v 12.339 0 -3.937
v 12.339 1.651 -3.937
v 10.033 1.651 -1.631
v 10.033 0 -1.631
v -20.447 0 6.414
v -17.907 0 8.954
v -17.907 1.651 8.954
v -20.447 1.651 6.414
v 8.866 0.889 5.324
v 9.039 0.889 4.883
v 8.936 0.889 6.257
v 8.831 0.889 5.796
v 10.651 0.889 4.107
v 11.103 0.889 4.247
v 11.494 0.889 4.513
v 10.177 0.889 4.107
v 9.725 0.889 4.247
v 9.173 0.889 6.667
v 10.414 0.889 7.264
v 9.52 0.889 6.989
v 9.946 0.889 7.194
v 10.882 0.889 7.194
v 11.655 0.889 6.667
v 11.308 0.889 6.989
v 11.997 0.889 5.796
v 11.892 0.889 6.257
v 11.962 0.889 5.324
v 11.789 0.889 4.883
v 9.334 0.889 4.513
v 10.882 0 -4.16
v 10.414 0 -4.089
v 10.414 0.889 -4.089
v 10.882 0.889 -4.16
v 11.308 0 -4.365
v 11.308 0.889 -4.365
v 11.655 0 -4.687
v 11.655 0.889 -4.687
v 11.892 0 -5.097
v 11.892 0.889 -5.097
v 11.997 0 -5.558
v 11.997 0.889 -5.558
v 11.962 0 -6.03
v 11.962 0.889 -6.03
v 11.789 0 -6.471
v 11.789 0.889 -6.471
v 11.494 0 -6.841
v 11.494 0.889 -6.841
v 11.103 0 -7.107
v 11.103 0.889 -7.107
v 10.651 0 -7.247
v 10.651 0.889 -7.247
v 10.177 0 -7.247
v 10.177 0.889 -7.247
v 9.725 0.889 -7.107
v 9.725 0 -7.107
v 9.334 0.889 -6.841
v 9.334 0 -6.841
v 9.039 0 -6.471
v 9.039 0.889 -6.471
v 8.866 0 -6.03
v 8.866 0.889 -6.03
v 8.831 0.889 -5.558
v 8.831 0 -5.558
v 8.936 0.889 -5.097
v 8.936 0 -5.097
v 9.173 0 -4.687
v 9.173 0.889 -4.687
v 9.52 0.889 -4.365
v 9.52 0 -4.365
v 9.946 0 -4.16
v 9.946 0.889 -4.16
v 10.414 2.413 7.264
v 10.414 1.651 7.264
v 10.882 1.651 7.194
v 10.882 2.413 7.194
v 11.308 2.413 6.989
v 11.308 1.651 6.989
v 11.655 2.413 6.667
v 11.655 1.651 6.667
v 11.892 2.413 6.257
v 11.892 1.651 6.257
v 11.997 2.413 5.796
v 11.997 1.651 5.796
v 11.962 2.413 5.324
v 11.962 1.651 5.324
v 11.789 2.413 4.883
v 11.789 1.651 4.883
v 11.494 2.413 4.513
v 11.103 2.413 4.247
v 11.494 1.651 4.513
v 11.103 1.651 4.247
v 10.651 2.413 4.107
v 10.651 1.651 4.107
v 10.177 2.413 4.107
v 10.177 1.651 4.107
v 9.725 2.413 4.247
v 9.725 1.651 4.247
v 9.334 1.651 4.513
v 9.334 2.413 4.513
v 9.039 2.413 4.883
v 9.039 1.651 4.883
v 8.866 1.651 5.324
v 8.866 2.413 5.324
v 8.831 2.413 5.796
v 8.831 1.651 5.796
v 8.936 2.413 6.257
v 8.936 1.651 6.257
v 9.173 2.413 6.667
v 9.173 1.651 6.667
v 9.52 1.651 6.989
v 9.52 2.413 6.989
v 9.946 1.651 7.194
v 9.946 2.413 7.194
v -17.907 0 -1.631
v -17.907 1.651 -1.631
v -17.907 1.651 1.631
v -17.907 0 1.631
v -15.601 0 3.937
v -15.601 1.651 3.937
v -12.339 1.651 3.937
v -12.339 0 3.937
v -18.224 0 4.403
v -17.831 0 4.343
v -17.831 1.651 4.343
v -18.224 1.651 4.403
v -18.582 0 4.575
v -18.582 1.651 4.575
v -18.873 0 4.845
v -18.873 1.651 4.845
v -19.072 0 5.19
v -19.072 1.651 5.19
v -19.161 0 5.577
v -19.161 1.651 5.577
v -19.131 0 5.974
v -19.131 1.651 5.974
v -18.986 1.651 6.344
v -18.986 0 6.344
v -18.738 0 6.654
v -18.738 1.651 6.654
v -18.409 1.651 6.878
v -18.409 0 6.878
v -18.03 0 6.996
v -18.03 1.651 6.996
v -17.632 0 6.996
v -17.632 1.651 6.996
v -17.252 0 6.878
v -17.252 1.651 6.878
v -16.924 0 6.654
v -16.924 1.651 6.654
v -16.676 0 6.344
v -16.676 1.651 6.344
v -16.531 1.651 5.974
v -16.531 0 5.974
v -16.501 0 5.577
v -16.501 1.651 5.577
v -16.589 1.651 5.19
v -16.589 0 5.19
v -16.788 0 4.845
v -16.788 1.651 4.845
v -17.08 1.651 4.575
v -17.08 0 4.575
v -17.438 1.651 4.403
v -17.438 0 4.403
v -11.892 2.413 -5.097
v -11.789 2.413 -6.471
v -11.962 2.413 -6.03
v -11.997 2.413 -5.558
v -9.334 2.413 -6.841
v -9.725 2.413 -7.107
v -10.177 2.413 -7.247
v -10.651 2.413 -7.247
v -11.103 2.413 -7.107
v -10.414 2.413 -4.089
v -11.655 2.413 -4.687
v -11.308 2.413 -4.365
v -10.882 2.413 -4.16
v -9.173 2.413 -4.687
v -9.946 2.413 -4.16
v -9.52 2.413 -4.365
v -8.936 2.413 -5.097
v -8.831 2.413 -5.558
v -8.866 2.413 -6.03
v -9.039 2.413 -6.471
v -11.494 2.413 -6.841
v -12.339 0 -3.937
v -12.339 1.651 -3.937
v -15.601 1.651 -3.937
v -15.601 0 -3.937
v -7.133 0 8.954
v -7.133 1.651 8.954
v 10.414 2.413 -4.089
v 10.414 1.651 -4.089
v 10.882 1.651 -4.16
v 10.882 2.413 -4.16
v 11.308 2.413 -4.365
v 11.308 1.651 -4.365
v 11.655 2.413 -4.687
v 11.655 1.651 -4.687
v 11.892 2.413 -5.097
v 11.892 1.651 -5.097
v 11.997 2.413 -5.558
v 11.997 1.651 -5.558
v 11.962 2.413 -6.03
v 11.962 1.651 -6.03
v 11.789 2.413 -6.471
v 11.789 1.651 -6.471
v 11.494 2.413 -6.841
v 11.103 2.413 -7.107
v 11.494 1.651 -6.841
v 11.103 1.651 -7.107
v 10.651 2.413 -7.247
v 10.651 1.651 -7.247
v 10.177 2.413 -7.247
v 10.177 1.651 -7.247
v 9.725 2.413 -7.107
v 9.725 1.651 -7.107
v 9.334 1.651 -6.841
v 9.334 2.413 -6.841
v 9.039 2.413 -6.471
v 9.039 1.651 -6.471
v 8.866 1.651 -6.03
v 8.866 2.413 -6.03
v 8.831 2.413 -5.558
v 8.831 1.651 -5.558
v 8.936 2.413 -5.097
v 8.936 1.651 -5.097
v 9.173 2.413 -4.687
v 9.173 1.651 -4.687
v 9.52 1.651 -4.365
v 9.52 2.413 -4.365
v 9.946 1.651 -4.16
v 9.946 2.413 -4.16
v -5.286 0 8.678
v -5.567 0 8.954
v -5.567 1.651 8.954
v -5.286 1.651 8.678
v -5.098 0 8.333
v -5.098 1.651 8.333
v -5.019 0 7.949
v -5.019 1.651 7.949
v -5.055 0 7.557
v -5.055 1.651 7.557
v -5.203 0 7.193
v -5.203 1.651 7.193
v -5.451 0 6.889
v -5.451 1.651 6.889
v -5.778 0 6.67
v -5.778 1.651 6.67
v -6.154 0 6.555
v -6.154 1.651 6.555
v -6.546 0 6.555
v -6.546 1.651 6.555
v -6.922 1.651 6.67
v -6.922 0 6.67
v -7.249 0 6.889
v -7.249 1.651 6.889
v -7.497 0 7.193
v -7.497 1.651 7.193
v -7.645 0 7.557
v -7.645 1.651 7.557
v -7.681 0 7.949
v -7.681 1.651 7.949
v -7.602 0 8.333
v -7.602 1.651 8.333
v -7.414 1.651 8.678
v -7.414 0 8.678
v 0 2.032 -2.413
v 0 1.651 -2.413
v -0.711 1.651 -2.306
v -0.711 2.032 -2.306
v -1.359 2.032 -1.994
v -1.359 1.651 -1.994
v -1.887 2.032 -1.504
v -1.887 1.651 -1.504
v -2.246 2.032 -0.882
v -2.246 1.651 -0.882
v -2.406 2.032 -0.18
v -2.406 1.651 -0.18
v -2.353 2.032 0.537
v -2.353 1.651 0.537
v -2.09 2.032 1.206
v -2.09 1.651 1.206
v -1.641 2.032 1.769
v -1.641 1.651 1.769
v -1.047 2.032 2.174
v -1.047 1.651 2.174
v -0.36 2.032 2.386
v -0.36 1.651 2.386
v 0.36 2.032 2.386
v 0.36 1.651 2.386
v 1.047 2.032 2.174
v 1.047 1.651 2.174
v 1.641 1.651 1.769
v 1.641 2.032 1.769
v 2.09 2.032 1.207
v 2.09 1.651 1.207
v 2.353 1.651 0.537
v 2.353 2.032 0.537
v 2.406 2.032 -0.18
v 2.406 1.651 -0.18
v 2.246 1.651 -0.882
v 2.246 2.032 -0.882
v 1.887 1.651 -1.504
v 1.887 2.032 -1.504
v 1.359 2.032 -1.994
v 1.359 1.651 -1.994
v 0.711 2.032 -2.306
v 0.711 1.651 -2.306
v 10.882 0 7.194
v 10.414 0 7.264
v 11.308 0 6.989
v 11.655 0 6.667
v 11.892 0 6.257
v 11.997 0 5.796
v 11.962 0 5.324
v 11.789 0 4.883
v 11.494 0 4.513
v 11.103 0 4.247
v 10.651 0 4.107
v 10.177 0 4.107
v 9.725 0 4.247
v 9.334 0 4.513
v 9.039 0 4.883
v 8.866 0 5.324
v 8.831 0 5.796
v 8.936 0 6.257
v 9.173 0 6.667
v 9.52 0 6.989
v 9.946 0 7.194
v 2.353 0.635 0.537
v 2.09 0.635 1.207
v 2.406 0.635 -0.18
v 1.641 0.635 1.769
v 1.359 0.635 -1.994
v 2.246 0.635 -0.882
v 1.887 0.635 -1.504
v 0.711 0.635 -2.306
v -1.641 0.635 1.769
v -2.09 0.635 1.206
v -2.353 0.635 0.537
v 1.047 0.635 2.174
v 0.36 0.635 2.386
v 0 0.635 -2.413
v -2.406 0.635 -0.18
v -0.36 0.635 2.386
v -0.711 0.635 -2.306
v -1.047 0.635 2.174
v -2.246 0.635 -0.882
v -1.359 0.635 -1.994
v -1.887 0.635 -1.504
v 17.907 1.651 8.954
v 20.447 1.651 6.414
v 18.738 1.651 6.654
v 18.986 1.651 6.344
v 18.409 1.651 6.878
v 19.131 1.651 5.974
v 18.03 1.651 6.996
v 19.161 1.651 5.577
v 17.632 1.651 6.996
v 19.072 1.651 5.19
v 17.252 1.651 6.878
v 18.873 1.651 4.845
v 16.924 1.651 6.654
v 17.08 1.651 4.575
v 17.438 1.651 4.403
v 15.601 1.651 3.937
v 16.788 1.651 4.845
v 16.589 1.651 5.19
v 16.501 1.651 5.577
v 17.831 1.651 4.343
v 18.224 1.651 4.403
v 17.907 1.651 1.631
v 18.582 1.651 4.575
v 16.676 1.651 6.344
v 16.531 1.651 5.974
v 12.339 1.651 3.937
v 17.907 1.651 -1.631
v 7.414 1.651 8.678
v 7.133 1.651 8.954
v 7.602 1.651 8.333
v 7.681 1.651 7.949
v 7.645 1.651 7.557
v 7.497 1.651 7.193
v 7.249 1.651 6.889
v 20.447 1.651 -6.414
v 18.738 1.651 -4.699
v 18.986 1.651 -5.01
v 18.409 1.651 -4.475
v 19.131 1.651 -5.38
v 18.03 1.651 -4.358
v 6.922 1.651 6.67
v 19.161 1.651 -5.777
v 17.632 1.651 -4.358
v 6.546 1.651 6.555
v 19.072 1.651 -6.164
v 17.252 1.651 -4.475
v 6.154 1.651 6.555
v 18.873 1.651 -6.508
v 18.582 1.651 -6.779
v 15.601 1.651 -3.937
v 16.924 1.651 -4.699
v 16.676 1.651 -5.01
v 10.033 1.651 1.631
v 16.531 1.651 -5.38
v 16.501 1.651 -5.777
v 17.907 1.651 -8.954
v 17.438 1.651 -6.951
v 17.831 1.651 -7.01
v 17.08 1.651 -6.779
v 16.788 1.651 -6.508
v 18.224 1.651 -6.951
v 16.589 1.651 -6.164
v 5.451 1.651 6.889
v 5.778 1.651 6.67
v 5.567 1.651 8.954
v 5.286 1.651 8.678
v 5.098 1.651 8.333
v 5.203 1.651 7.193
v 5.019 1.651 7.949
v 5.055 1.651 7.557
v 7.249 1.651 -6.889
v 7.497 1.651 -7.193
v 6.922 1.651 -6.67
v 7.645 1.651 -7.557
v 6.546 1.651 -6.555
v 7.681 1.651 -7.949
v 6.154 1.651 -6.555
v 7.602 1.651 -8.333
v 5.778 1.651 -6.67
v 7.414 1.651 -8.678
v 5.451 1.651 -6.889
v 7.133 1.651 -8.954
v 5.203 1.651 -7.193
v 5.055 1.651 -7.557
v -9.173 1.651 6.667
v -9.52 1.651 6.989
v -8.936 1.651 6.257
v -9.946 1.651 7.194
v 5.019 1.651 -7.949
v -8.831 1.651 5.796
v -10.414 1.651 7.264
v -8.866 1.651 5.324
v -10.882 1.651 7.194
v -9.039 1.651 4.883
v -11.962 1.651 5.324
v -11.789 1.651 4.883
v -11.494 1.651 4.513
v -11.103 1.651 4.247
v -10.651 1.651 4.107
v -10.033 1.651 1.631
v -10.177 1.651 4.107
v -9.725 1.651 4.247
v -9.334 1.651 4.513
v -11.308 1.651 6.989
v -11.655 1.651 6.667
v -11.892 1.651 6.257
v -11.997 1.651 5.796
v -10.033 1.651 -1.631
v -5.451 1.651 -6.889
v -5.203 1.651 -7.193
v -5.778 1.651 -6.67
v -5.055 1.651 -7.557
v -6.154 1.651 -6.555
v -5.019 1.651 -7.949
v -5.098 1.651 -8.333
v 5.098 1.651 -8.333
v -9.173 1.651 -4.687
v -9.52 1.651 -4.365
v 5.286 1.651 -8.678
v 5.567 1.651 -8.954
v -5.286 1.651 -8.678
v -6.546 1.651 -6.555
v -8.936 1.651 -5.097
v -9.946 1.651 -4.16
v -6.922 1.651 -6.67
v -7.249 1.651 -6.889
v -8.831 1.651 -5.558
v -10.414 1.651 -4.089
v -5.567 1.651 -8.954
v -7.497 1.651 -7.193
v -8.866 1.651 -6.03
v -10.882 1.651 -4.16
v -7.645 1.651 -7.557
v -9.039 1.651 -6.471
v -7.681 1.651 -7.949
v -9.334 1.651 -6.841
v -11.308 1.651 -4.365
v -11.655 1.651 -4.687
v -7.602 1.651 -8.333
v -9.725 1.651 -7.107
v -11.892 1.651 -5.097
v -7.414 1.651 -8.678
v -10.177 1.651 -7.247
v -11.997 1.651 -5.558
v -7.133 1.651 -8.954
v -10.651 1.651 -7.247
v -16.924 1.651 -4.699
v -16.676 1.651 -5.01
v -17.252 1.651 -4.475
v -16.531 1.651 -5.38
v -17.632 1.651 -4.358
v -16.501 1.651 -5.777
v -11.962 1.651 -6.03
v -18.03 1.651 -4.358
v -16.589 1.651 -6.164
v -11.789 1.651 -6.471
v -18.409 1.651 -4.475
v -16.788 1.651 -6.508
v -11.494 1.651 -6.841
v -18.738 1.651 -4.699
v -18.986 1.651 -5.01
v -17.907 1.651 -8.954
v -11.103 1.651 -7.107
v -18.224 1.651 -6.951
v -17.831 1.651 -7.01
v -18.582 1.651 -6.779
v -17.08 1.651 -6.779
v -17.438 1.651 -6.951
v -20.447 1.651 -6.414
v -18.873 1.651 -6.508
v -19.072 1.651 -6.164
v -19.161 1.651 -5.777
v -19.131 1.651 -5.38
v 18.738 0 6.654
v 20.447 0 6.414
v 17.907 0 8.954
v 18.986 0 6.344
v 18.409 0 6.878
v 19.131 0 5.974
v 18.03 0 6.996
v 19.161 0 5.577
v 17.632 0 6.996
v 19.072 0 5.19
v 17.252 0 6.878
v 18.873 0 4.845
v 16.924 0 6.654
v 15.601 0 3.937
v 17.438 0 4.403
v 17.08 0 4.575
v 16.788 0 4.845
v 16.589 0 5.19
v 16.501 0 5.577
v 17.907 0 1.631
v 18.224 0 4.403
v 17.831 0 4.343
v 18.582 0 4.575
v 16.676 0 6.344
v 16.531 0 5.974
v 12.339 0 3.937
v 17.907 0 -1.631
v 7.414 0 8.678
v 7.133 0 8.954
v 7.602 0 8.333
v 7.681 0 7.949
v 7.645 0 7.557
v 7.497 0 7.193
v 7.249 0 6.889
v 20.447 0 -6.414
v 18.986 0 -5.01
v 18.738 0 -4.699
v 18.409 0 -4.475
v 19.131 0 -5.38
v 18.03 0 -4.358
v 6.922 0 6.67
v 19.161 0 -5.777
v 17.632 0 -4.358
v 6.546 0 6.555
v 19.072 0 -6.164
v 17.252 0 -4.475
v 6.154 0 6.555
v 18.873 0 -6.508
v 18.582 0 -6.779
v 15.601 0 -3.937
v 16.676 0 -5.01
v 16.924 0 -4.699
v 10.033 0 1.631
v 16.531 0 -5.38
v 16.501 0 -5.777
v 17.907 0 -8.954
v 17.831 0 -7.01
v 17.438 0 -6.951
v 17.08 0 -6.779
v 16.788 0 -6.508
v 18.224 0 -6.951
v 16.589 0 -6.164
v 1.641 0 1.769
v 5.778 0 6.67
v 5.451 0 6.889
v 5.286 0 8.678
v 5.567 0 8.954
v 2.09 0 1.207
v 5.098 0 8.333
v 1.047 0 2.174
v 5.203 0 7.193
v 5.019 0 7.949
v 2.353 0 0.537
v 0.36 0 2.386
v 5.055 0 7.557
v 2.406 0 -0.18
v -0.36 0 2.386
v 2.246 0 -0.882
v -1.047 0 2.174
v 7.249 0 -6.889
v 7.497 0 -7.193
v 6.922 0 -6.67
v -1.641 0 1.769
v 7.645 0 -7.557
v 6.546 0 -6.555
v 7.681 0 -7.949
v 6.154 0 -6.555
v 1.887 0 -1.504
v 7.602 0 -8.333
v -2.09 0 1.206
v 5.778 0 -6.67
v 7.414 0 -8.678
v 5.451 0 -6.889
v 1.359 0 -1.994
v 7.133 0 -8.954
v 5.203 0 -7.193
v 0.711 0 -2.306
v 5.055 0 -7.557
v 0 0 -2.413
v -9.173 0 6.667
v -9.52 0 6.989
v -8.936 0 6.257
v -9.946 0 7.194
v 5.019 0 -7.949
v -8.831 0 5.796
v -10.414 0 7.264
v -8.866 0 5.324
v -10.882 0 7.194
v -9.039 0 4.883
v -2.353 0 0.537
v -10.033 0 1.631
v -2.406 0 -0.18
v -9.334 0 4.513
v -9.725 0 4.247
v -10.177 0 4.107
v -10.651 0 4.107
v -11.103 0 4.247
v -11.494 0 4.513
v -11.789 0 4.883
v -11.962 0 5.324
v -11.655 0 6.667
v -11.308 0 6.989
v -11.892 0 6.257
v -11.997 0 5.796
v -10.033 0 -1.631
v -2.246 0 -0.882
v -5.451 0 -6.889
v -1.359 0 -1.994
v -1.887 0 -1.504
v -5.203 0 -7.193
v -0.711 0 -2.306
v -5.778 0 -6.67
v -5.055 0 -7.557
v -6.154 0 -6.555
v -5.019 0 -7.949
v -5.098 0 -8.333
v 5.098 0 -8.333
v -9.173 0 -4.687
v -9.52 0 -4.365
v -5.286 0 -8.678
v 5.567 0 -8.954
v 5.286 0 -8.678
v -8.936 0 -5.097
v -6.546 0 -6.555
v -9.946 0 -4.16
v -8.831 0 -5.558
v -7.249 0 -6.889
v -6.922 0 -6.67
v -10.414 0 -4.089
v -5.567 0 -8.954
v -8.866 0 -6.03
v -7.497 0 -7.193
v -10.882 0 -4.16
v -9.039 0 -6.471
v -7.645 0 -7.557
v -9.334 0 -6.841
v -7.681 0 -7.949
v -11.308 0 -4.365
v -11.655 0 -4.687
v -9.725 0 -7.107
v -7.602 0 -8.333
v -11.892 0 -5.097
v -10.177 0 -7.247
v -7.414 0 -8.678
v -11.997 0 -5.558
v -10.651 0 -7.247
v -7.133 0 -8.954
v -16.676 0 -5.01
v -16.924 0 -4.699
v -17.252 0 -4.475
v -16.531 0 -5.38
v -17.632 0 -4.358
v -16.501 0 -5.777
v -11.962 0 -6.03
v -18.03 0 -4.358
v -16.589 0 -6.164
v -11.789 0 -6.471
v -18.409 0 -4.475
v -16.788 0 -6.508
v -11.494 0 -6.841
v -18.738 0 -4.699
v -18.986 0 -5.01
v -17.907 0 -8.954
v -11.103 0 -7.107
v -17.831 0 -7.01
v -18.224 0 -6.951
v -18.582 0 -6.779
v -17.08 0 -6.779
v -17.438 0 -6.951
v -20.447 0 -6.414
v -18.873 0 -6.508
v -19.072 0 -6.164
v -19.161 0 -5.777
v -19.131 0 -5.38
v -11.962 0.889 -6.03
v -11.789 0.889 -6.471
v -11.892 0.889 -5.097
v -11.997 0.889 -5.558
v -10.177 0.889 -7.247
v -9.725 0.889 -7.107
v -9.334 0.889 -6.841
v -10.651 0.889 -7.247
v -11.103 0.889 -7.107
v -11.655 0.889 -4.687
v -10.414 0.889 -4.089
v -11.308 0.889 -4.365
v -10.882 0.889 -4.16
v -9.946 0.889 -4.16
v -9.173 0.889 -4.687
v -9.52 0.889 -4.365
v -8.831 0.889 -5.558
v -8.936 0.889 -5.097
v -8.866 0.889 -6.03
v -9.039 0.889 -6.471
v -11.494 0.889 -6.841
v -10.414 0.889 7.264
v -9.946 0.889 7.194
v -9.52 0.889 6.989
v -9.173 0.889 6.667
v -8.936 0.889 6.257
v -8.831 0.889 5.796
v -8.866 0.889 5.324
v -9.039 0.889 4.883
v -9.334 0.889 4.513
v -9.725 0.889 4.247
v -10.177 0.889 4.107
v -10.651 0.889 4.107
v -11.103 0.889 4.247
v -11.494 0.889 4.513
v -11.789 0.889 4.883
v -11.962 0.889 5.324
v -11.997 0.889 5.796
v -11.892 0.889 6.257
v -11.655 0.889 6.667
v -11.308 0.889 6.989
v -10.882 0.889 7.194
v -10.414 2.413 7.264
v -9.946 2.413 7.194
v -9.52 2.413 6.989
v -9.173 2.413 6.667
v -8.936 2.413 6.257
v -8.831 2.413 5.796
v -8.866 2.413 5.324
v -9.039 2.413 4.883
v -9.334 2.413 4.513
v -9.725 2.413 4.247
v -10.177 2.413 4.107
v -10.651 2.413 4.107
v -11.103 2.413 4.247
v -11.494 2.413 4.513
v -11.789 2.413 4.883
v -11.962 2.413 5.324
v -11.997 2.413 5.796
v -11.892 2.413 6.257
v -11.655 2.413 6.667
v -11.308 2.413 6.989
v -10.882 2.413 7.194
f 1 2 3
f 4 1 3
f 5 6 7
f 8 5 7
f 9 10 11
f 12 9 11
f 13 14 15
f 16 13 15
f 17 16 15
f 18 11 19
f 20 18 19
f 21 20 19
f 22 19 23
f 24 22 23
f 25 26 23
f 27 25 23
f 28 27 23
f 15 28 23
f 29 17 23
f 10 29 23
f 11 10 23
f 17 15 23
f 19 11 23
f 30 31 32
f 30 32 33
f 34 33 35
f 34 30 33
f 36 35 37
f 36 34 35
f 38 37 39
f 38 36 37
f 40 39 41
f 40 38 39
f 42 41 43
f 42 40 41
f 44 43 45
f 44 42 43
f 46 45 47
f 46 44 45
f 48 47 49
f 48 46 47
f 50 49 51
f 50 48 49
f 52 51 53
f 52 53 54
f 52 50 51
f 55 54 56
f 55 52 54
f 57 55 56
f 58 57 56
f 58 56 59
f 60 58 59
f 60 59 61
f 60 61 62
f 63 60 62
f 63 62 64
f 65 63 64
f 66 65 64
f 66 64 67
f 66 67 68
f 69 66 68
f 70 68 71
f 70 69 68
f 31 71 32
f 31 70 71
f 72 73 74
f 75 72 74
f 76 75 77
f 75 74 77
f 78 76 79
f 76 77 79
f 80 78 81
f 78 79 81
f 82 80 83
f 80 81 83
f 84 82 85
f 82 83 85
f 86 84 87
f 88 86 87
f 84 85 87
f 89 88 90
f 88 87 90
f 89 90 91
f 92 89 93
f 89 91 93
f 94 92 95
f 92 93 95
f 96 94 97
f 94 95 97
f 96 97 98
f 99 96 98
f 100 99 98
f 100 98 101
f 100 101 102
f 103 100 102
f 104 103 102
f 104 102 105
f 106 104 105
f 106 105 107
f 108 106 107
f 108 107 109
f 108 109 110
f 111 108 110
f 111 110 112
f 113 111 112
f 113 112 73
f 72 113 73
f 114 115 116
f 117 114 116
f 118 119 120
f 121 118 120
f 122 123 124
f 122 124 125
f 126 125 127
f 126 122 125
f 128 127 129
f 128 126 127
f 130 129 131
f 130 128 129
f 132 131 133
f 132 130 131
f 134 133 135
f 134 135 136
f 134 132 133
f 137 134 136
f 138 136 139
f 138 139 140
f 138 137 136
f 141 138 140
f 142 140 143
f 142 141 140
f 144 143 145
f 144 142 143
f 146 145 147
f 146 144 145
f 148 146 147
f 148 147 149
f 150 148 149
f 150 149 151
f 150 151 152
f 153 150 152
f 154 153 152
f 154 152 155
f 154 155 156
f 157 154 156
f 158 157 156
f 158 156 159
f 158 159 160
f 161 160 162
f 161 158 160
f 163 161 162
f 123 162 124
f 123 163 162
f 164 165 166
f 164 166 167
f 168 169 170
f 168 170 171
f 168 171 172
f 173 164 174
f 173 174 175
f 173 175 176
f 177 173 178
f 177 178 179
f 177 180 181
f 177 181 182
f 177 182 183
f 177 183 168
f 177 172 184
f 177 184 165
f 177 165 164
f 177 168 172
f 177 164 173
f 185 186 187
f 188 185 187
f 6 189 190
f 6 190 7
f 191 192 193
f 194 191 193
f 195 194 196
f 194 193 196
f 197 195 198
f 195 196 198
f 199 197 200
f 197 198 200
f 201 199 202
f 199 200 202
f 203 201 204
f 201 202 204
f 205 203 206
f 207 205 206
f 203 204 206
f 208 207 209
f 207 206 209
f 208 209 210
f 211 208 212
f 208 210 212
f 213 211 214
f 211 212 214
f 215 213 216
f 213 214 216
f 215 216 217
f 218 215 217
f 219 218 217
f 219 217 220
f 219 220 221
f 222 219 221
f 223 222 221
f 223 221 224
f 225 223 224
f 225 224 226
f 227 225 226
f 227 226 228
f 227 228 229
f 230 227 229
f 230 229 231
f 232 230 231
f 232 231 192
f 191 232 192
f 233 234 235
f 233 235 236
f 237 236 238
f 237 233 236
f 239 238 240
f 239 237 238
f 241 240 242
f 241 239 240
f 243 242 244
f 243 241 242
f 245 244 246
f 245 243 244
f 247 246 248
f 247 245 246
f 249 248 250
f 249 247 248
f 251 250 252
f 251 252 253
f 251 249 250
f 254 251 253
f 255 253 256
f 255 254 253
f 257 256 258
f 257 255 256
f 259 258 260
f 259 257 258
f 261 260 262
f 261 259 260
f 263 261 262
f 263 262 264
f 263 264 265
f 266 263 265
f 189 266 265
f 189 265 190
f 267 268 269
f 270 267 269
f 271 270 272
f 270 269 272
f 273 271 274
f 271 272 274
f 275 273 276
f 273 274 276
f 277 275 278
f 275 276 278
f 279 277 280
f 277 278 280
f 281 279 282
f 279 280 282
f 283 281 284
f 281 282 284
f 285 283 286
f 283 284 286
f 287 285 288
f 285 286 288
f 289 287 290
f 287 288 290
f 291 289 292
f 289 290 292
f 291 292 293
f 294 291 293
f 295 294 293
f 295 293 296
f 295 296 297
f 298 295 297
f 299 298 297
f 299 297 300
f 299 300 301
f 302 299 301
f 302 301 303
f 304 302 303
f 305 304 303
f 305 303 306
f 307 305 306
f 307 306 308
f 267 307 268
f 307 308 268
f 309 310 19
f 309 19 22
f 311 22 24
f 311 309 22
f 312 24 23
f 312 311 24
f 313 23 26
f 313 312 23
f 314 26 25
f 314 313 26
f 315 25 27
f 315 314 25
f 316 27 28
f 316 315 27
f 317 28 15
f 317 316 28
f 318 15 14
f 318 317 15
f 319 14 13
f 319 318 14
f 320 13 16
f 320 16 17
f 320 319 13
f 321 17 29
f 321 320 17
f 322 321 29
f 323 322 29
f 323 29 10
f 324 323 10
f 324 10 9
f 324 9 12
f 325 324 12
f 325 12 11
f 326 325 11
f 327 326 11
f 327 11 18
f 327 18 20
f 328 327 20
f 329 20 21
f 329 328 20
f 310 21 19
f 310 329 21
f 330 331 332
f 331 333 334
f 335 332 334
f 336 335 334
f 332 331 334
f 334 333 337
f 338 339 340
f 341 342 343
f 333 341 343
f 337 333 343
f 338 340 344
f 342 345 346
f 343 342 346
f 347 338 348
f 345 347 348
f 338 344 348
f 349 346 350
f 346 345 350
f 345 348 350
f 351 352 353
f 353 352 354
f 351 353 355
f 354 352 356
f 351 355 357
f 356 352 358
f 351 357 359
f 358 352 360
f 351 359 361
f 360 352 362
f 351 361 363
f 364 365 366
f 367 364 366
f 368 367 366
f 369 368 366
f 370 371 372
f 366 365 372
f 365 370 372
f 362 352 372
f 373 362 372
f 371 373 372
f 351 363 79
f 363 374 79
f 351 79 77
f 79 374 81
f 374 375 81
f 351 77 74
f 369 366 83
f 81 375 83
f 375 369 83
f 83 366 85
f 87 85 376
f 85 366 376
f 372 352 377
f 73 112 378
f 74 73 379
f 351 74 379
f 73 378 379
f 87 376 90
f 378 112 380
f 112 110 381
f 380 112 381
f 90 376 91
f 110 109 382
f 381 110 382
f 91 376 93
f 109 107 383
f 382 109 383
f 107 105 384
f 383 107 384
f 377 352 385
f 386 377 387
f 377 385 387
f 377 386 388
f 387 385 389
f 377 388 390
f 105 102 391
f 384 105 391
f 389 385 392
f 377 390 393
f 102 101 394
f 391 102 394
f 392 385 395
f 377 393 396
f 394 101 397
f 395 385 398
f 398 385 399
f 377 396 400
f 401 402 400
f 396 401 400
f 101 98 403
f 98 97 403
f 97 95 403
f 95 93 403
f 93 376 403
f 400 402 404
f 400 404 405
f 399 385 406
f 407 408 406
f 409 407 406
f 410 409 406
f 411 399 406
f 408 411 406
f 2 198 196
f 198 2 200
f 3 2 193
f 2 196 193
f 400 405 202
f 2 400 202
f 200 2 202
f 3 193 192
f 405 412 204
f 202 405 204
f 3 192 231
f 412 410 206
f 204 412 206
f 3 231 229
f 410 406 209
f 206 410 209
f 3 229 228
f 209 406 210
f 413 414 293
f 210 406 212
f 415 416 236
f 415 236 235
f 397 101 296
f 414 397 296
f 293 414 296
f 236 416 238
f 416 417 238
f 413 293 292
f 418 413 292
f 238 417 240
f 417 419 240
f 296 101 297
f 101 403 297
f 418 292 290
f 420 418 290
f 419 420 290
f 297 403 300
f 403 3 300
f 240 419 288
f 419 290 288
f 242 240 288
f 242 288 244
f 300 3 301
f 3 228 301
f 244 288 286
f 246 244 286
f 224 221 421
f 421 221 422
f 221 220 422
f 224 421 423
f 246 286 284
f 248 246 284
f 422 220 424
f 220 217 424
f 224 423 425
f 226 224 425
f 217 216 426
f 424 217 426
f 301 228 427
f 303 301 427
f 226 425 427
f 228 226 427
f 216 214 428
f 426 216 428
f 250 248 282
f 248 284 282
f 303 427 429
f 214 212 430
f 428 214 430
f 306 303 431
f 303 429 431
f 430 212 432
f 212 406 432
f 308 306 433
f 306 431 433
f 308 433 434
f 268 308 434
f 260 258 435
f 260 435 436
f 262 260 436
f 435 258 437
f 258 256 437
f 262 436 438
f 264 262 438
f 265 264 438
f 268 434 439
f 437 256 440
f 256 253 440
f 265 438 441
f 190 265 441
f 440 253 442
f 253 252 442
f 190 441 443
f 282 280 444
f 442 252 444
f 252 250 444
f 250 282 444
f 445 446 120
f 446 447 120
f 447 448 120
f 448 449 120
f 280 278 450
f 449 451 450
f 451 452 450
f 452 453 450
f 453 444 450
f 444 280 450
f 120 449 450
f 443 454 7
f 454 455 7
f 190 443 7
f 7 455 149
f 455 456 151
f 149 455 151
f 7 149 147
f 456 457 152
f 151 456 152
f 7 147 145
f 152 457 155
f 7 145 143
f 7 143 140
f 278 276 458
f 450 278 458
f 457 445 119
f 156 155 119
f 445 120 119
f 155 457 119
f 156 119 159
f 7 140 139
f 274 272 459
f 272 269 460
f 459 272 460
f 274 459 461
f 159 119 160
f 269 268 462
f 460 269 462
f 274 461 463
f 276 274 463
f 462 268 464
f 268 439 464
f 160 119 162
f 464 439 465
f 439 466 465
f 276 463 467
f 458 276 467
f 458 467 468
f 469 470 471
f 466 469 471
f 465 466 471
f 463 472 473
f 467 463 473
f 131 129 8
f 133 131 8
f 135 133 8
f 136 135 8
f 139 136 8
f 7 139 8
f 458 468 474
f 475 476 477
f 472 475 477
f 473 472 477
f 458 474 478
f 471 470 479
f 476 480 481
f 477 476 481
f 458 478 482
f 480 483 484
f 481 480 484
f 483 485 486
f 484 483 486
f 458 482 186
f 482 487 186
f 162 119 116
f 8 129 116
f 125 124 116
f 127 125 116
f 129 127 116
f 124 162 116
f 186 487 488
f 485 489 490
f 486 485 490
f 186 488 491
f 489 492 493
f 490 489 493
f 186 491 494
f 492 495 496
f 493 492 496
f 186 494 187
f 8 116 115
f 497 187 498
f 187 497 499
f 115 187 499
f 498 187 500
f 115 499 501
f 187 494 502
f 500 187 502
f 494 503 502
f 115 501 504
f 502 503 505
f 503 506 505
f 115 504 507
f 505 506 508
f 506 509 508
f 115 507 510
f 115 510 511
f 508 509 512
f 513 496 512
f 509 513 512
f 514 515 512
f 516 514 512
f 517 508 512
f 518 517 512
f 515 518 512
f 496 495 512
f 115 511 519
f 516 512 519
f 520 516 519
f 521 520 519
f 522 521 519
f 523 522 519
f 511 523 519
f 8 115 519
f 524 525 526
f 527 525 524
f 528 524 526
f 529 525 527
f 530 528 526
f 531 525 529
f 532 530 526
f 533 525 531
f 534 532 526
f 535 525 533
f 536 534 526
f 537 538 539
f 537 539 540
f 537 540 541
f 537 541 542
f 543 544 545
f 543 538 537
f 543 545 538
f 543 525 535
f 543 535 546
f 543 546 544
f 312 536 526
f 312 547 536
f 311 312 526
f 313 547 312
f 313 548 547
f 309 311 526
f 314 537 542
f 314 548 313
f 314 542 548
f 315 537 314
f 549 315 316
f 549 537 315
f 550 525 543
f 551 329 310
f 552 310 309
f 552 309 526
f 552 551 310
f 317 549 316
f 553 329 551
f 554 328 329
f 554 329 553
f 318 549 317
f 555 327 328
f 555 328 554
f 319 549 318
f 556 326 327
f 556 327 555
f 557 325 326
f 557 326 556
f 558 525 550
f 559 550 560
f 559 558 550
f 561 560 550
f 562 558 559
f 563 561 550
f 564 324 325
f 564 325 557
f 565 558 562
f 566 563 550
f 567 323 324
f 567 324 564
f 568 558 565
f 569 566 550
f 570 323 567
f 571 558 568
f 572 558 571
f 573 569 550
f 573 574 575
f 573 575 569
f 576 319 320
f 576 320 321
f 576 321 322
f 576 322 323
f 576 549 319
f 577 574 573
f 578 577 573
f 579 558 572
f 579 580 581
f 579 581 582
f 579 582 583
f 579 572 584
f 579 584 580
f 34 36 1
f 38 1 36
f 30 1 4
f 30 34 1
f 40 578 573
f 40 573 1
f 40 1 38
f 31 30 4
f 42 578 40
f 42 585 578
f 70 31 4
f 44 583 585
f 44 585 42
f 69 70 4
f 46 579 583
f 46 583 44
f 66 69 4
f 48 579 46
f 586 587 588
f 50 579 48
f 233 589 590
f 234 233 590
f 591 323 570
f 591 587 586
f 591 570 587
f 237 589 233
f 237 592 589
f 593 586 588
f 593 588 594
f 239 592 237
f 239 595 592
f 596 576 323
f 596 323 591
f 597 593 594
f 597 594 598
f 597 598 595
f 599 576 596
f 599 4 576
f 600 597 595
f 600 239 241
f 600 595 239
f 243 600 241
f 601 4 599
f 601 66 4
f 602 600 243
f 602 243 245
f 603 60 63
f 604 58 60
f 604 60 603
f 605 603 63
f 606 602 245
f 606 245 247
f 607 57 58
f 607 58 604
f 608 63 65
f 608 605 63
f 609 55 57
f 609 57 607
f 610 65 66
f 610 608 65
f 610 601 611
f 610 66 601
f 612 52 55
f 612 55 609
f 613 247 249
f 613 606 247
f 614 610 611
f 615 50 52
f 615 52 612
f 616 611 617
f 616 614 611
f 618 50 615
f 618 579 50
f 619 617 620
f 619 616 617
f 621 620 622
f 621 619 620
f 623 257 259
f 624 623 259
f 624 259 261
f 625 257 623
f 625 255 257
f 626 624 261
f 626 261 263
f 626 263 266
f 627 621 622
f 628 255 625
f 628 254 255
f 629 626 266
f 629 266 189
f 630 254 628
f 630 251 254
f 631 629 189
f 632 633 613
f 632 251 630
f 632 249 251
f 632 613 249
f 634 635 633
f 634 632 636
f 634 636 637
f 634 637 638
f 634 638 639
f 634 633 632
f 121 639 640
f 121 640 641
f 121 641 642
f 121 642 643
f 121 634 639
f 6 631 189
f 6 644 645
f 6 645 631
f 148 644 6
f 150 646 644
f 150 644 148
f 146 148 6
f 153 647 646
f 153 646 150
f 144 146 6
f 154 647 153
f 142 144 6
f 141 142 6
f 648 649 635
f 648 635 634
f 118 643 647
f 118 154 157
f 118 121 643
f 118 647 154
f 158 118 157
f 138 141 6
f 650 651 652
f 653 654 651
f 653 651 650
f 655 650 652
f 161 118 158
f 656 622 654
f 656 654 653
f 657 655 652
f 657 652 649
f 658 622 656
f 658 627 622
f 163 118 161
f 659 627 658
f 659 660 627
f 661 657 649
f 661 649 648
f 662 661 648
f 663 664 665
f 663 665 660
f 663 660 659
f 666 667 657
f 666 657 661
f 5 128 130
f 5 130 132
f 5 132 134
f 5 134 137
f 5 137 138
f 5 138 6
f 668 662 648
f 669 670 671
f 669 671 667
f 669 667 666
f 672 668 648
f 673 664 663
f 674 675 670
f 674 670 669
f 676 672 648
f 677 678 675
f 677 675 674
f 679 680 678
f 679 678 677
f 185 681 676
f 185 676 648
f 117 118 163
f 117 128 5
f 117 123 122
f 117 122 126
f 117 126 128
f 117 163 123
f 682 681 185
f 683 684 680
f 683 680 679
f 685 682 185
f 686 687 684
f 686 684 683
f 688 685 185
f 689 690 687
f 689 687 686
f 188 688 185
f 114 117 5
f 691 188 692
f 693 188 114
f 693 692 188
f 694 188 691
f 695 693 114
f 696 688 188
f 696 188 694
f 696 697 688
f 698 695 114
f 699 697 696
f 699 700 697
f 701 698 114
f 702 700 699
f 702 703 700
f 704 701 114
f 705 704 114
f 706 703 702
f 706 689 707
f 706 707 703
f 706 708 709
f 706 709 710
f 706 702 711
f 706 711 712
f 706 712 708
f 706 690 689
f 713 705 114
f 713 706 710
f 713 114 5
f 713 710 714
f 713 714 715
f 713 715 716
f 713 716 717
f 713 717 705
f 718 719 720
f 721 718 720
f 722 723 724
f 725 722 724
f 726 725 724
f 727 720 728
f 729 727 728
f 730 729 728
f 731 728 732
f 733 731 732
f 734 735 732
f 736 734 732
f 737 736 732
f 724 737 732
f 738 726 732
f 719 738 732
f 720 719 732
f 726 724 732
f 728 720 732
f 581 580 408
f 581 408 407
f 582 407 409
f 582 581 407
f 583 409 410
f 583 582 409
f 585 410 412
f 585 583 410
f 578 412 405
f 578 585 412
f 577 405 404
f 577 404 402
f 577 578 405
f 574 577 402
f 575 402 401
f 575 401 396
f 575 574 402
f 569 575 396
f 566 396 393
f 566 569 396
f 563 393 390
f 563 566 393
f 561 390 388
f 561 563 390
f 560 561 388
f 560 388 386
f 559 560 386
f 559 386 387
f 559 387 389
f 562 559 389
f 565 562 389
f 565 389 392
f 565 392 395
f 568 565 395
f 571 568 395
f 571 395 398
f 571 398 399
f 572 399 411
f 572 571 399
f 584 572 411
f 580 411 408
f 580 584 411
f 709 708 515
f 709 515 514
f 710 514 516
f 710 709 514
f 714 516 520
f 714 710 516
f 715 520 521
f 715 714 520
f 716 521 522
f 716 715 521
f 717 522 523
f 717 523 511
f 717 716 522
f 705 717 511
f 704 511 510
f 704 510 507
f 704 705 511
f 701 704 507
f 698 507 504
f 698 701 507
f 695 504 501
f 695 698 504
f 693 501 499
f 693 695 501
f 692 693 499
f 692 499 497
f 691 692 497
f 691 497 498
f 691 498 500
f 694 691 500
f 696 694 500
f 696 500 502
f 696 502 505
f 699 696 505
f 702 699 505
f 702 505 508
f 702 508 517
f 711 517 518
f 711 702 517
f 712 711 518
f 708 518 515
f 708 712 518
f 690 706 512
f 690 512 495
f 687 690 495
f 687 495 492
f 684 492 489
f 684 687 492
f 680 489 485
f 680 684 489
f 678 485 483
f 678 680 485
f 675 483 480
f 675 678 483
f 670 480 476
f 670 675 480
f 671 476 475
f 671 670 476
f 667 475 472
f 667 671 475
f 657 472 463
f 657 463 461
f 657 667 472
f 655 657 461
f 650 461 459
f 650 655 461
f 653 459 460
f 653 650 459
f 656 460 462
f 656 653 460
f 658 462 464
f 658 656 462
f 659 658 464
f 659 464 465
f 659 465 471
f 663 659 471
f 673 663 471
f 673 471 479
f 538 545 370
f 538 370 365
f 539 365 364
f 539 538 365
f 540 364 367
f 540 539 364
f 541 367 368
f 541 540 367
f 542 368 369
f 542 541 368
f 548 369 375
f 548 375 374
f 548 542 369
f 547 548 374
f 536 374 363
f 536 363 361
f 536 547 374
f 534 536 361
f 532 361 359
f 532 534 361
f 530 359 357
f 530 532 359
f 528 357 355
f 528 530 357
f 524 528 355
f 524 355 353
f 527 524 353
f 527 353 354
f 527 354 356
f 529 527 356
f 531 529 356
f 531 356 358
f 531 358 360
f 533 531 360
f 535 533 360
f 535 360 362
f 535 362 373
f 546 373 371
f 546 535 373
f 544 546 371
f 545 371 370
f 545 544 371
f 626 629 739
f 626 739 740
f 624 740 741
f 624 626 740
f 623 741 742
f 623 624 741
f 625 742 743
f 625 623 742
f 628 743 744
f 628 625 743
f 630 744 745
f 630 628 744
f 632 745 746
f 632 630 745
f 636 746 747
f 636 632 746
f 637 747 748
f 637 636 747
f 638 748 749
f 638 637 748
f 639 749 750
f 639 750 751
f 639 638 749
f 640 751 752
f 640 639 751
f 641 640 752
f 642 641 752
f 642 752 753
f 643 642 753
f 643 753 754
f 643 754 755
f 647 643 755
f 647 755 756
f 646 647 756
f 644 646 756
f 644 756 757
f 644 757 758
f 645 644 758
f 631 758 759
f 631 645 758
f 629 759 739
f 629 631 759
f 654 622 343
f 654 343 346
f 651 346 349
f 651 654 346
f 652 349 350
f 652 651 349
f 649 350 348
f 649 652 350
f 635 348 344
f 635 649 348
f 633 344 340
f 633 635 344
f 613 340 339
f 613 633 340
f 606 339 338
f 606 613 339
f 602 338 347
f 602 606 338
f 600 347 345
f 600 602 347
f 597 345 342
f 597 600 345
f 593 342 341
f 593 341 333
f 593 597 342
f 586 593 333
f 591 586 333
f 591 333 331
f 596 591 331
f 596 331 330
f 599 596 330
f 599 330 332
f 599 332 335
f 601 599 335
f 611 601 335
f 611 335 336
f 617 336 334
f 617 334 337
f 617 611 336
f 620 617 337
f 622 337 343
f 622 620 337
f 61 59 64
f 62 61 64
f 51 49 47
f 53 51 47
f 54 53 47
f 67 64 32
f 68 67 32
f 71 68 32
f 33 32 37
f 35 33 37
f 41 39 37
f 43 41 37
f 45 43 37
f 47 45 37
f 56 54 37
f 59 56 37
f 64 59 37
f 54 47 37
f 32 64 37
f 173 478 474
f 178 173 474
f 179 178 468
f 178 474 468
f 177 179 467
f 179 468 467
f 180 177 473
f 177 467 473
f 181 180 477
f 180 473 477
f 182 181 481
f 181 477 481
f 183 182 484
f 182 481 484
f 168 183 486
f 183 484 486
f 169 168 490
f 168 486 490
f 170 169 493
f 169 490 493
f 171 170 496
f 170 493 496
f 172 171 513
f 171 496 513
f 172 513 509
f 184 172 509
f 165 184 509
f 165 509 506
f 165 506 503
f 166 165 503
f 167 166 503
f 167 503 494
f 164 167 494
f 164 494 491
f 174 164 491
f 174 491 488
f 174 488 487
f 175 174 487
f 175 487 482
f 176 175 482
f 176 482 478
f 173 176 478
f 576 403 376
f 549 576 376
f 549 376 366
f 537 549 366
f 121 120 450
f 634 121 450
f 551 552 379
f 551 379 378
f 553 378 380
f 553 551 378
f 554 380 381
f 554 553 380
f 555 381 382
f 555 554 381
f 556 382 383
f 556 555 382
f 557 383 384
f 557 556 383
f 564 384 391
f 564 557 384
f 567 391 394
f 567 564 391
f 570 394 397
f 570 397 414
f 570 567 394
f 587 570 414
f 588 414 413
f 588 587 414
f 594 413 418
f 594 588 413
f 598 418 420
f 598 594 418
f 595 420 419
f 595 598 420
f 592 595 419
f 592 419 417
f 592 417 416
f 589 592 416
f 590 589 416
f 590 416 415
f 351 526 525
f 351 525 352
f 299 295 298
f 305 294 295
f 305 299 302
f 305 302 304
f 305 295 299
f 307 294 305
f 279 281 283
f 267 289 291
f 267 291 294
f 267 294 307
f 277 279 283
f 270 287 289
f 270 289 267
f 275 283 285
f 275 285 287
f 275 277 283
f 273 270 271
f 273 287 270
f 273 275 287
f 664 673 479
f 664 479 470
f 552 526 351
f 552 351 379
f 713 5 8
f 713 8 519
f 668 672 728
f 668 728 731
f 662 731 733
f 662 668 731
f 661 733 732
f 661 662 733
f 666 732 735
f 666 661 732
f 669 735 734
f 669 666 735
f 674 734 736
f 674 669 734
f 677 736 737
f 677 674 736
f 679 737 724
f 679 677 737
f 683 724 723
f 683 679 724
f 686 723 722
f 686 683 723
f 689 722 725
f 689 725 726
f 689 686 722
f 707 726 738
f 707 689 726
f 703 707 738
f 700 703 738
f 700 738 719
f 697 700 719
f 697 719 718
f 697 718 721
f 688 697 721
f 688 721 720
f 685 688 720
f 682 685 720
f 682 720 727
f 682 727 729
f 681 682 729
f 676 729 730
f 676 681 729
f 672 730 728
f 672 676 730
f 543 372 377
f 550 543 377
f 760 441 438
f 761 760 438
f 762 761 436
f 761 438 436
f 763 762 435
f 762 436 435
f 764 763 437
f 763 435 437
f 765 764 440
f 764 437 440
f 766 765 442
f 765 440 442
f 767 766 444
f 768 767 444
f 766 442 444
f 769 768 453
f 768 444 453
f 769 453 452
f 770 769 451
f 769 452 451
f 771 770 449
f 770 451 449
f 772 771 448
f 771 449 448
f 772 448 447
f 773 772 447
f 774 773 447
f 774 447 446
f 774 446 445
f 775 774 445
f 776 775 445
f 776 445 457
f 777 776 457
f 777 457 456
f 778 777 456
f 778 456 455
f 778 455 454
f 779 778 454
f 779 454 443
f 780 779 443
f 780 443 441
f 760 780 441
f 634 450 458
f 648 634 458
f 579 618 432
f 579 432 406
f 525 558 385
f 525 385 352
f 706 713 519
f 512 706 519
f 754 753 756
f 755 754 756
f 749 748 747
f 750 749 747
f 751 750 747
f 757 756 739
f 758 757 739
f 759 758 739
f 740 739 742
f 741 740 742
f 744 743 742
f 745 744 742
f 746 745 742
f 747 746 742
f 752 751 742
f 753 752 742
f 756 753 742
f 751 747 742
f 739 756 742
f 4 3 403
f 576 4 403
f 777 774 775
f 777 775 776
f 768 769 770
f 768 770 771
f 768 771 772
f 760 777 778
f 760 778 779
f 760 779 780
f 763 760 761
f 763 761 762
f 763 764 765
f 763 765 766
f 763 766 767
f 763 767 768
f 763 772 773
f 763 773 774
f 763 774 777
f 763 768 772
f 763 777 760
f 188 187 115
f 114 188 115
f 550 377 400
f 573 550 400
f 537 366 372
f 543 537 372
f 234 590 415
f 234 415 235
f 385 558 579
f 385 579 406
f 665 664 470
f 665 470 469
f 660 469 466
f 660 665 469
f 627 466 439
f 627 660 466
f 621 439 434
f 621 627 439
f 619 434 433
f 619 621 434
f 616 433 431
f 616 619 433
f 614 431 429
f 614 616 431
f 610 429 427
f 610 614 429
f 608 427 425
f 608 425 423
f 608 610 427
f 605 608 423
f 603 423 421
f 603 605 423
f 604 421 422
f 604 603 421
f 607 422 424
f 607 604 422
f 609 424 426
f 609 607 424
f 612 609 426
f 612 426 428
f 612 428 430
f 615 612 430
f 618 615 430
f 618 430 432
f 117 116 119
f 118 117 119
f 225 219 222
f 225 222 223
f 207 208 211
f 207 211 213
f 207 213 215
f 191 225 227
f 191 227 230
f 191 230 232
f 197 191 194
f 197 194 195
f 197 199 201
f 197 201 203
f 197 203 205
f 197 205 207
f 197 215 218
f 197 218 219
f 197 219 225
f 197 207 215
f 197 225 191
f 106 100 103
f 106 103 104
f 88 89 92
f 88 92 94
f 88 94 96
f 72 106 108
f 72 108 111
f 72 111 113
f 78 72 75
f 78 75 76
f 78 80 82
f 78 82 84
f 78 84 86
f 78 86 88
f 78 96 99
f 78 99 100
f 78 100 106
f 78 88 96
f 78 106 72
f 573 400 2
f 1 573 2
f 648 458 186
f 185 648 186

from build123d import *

# Parameters (mm, degrees)
SKETCH1_R           = 1.3335
SKETCH1_R_2         = 1.5875
BOSS_EXTRUDE1_DEPTH = 1.651
CHAMFER1_SIZE       = 2.54
SKETCH1_2_R         = 1.5875
BOSS_EXTRUDE2_DEPTH = 2.413
SKETCH1_3_R         = 1.5875
CUT_EXTRUDE1_DEPTH  = 0.889
CUT_EXTRUDE3_DEPTH  = 23.382376376
SKETCH4_R           = 2.413
BOSS_EXTRUDE3_DEPTH = 0.381
CUT_EXTRUDE4_START  = -1.651
SKETCH4_2_R         = 2.413
CUT_EXTRUDE4_DEPTH  = 0.635


with BuildPart() as part:
    # Sketch1 → Boss-Extrude1 (new body)
    with BuildSketch(Plane(origin=(0, 0, 0), x_dir=(1, 0, 0), z_dir=(0, 1, 0))):
        with BuildLine():
            Line((-5.567119422, 8.9535), (5.567119422, 8.9535))
            ThreePointArc((5.567119422, 8.9535), (6.35, 6.5405), (7.132880578, 8.9535))
            Line((7.132880578, 8.9535), (20.447, 8.9535))
            Line((20.447, 8.9535), (20.447, -8.9535))
            Line((20.447, -8.9535), (7.132880578, -8.9535))
            ThreePointArc((7.132880578, -8.9535), (6.35, -6.5405), (5.567119422, -8.9535))
            Line((5.567119422, -8.9535), (-5.567119422, -8.9535))
            ThreePointArc((-5.567119422, -8.9535), (-6.35, -6.5405), (-7.132880578, -8.9535))
            Line((-7.132880578, -8.9535), (-20.447, -8.9535))
            Line((-20.447, -8.9535), (-20.447, 8.9535))
            Line((-20.447, 8.9535), (-7.132880578, 8.9535))
            ThreePointArc((-7.132880578, 8.9535), (-6.35, 6.5405), (-5.567119422, 8.9535))
        make_face()
        with Locations(Location((-17.8308, 5.6769, 0), (0, 0, 90))):
            Circle(SKETCH1_R, mode=Mode.SUBTRACT)
        with Locations(Location((17.8308, 5.6769, 0), (0, 0, 90))):
            Circle(SKETCH1_R, mode=Mode.SUBTRACT)
        with Locations(Location((17.8308, -5.6769, 0), (0, 0, 90))):
            Circle(SKETCH1_R, mode=Mode.SUBTRACT)
        with Locations(Location((-17.8308, -5.6769, 0), (0, 0, 90))):
            Circle(SKETCH1_R, mode=Mode.SUBTRACT)
        with Locations(Location((-10.414, 5.6769, 0), (0, 0, 90))):
            Circle(SKETCH1_R_2, mode=Mode.SUBTRACT)
        with Locations(Location((10.414, 5.6769, 0), (0, 0, 90))):
            Circle(SKETCH1_R_2, mode=Mode.SUBTRACT)
        with Locations(Location((10.414, -5.6769, 0), (0, 0, 90))):
            Circle(SKETCH1_R_2, mode=Mode.SUBTRACT)
        with Locations(Location((-10.414, -5.6769, 0), (0, 0, 90))):
            Circle(SKETCH1_R_2, mode=Mode.SUBTRACT)
    extrude(amount=BOSS_EXTRUDE1_DEPTH)

    # Chamfer1
    chamfer1_edges = [part.edges().sort_by_distance(p)[0] for p in [
        (20.447, 0.8255, -8.9535),
        (20.447, 0.8255, 8.9535),
        (-20.447, 0.8255, 8.9535),
        (-20.447, 0.8255, -8.9535),
    ]]
    chamfer(chamfer1_edges, length=CHAMFER1_SIZE)

    # Sketch1<2> → Boss-Extrude2 (add)
    with BuildSketch(Plane(origin=(0, 0, 0), x_dir=(1, 0, 0), z_dir=(0, 1, 0))):
        with Locations(Location((-10.414, 5.6769, 0), (0, 0, 270))):
            Circle(SKETCH1_2_R)
        with Locations(Location((10.414, 5.6769, 0), (0, 0, 270))):
            Circle(SKETCH1_2_R)
        with Locations(Location((10.414, -5.6769, 0), (0, 0, 270))):
            Circle(SKETCH1_2_R)
        with Locations(Location((-10.414, -5.6769, 0), (0, 0, 270))):
            Circle(SKETCH1_2_R)
    extrude(amount=BOSS_EXTRUDE2_DEPTH)

    # Sketch1<3> → Cut-Extrude1 (cut)
    with BuildSketch(Plane(origin=(0, 0, 0), x_dir=(1, 0, 0), z_dir=(0, 1, 0))):
        with Locations(Location((-10.414, 5.6769, 0), (0, 0, 270))):
            Circle(SKETCH1_3_R)
        with Locations(Location((10.414, 5.6769, 0), (0, 0, 270))):
            Circle(SKETCH1_3_R)
        with Locations(Location((10.414, -5.6769, 0), (0, 0, 270))):
            Circle(SKETCH1_3_R)
        with Locations(Location((-10.414, -5.6769, 0), (0, 0, 270))):
            Circle(SKETCH1_3_R)
    extrude(amount=CUT_EXTRUDE1_DEPTH, mode=Mode.SUBTRACT)

    # Sketch3 → Cut-Extrude3 (cut, through all)
    with BuildSketch(Plane(origin=(0, 1.651, 0), x_dir=(1, 0, 0), z_dir=(0, 1, 0))):
        Polygon((-10.033, 1.630758795), (-12.339241205, 3.937), (-15.600758795, 3.937), (-17.907, 1.630758795), (-17.907, -1.630758795), (-15.600758795, -3.937), (-12.339241205, -3.937), (-10.033, -1.630758795), align=None)
        Polygon((17.907, 1.630758795), (15.600758795, 3.937), (12.339241205, 3.937), (10.033, 1.630758795), (10.033, -1.630758795), (12.339241205, -3.937), (15.600758795, -3.937), (17.907, -1.630758795), align=None)
    extrude(amount=-CUT_EXTRUDE3_DEPTH, mode=Mode.SUBTRACT)

    # Sketch4 → Boss-Extrude3 (add)
    with BuildSketch(Plane(origin=(0, 1.651, 0), x_dir=(1, 0, 0), z_dir=(0, 1, 0))):
        with Locations(Location((0, 0, 0), (0, 0, 90))):
            Circle(SKETCH4_R)
    extrude(amount=BOSS_EXTRUDE3_DEPTH)

    # Sketch4<2> → Cut-Extrude4 (cut)
    with BuildSketch(Plane(origin=(0, 1.651, 0), x_dir=(1, 0, 0), z_dir=(0, 1, 0)).offset(CUT_EXTRUDE4_START)):
        with Locations(Location((0, 0, 0), (0, 0, 90))):
            Circle(SKETCH4_2_R)
    extrude(amount=CUT_EXTRUDE4_DEPTH, mode=Mode.SUBTRACT)


solid = part.part
